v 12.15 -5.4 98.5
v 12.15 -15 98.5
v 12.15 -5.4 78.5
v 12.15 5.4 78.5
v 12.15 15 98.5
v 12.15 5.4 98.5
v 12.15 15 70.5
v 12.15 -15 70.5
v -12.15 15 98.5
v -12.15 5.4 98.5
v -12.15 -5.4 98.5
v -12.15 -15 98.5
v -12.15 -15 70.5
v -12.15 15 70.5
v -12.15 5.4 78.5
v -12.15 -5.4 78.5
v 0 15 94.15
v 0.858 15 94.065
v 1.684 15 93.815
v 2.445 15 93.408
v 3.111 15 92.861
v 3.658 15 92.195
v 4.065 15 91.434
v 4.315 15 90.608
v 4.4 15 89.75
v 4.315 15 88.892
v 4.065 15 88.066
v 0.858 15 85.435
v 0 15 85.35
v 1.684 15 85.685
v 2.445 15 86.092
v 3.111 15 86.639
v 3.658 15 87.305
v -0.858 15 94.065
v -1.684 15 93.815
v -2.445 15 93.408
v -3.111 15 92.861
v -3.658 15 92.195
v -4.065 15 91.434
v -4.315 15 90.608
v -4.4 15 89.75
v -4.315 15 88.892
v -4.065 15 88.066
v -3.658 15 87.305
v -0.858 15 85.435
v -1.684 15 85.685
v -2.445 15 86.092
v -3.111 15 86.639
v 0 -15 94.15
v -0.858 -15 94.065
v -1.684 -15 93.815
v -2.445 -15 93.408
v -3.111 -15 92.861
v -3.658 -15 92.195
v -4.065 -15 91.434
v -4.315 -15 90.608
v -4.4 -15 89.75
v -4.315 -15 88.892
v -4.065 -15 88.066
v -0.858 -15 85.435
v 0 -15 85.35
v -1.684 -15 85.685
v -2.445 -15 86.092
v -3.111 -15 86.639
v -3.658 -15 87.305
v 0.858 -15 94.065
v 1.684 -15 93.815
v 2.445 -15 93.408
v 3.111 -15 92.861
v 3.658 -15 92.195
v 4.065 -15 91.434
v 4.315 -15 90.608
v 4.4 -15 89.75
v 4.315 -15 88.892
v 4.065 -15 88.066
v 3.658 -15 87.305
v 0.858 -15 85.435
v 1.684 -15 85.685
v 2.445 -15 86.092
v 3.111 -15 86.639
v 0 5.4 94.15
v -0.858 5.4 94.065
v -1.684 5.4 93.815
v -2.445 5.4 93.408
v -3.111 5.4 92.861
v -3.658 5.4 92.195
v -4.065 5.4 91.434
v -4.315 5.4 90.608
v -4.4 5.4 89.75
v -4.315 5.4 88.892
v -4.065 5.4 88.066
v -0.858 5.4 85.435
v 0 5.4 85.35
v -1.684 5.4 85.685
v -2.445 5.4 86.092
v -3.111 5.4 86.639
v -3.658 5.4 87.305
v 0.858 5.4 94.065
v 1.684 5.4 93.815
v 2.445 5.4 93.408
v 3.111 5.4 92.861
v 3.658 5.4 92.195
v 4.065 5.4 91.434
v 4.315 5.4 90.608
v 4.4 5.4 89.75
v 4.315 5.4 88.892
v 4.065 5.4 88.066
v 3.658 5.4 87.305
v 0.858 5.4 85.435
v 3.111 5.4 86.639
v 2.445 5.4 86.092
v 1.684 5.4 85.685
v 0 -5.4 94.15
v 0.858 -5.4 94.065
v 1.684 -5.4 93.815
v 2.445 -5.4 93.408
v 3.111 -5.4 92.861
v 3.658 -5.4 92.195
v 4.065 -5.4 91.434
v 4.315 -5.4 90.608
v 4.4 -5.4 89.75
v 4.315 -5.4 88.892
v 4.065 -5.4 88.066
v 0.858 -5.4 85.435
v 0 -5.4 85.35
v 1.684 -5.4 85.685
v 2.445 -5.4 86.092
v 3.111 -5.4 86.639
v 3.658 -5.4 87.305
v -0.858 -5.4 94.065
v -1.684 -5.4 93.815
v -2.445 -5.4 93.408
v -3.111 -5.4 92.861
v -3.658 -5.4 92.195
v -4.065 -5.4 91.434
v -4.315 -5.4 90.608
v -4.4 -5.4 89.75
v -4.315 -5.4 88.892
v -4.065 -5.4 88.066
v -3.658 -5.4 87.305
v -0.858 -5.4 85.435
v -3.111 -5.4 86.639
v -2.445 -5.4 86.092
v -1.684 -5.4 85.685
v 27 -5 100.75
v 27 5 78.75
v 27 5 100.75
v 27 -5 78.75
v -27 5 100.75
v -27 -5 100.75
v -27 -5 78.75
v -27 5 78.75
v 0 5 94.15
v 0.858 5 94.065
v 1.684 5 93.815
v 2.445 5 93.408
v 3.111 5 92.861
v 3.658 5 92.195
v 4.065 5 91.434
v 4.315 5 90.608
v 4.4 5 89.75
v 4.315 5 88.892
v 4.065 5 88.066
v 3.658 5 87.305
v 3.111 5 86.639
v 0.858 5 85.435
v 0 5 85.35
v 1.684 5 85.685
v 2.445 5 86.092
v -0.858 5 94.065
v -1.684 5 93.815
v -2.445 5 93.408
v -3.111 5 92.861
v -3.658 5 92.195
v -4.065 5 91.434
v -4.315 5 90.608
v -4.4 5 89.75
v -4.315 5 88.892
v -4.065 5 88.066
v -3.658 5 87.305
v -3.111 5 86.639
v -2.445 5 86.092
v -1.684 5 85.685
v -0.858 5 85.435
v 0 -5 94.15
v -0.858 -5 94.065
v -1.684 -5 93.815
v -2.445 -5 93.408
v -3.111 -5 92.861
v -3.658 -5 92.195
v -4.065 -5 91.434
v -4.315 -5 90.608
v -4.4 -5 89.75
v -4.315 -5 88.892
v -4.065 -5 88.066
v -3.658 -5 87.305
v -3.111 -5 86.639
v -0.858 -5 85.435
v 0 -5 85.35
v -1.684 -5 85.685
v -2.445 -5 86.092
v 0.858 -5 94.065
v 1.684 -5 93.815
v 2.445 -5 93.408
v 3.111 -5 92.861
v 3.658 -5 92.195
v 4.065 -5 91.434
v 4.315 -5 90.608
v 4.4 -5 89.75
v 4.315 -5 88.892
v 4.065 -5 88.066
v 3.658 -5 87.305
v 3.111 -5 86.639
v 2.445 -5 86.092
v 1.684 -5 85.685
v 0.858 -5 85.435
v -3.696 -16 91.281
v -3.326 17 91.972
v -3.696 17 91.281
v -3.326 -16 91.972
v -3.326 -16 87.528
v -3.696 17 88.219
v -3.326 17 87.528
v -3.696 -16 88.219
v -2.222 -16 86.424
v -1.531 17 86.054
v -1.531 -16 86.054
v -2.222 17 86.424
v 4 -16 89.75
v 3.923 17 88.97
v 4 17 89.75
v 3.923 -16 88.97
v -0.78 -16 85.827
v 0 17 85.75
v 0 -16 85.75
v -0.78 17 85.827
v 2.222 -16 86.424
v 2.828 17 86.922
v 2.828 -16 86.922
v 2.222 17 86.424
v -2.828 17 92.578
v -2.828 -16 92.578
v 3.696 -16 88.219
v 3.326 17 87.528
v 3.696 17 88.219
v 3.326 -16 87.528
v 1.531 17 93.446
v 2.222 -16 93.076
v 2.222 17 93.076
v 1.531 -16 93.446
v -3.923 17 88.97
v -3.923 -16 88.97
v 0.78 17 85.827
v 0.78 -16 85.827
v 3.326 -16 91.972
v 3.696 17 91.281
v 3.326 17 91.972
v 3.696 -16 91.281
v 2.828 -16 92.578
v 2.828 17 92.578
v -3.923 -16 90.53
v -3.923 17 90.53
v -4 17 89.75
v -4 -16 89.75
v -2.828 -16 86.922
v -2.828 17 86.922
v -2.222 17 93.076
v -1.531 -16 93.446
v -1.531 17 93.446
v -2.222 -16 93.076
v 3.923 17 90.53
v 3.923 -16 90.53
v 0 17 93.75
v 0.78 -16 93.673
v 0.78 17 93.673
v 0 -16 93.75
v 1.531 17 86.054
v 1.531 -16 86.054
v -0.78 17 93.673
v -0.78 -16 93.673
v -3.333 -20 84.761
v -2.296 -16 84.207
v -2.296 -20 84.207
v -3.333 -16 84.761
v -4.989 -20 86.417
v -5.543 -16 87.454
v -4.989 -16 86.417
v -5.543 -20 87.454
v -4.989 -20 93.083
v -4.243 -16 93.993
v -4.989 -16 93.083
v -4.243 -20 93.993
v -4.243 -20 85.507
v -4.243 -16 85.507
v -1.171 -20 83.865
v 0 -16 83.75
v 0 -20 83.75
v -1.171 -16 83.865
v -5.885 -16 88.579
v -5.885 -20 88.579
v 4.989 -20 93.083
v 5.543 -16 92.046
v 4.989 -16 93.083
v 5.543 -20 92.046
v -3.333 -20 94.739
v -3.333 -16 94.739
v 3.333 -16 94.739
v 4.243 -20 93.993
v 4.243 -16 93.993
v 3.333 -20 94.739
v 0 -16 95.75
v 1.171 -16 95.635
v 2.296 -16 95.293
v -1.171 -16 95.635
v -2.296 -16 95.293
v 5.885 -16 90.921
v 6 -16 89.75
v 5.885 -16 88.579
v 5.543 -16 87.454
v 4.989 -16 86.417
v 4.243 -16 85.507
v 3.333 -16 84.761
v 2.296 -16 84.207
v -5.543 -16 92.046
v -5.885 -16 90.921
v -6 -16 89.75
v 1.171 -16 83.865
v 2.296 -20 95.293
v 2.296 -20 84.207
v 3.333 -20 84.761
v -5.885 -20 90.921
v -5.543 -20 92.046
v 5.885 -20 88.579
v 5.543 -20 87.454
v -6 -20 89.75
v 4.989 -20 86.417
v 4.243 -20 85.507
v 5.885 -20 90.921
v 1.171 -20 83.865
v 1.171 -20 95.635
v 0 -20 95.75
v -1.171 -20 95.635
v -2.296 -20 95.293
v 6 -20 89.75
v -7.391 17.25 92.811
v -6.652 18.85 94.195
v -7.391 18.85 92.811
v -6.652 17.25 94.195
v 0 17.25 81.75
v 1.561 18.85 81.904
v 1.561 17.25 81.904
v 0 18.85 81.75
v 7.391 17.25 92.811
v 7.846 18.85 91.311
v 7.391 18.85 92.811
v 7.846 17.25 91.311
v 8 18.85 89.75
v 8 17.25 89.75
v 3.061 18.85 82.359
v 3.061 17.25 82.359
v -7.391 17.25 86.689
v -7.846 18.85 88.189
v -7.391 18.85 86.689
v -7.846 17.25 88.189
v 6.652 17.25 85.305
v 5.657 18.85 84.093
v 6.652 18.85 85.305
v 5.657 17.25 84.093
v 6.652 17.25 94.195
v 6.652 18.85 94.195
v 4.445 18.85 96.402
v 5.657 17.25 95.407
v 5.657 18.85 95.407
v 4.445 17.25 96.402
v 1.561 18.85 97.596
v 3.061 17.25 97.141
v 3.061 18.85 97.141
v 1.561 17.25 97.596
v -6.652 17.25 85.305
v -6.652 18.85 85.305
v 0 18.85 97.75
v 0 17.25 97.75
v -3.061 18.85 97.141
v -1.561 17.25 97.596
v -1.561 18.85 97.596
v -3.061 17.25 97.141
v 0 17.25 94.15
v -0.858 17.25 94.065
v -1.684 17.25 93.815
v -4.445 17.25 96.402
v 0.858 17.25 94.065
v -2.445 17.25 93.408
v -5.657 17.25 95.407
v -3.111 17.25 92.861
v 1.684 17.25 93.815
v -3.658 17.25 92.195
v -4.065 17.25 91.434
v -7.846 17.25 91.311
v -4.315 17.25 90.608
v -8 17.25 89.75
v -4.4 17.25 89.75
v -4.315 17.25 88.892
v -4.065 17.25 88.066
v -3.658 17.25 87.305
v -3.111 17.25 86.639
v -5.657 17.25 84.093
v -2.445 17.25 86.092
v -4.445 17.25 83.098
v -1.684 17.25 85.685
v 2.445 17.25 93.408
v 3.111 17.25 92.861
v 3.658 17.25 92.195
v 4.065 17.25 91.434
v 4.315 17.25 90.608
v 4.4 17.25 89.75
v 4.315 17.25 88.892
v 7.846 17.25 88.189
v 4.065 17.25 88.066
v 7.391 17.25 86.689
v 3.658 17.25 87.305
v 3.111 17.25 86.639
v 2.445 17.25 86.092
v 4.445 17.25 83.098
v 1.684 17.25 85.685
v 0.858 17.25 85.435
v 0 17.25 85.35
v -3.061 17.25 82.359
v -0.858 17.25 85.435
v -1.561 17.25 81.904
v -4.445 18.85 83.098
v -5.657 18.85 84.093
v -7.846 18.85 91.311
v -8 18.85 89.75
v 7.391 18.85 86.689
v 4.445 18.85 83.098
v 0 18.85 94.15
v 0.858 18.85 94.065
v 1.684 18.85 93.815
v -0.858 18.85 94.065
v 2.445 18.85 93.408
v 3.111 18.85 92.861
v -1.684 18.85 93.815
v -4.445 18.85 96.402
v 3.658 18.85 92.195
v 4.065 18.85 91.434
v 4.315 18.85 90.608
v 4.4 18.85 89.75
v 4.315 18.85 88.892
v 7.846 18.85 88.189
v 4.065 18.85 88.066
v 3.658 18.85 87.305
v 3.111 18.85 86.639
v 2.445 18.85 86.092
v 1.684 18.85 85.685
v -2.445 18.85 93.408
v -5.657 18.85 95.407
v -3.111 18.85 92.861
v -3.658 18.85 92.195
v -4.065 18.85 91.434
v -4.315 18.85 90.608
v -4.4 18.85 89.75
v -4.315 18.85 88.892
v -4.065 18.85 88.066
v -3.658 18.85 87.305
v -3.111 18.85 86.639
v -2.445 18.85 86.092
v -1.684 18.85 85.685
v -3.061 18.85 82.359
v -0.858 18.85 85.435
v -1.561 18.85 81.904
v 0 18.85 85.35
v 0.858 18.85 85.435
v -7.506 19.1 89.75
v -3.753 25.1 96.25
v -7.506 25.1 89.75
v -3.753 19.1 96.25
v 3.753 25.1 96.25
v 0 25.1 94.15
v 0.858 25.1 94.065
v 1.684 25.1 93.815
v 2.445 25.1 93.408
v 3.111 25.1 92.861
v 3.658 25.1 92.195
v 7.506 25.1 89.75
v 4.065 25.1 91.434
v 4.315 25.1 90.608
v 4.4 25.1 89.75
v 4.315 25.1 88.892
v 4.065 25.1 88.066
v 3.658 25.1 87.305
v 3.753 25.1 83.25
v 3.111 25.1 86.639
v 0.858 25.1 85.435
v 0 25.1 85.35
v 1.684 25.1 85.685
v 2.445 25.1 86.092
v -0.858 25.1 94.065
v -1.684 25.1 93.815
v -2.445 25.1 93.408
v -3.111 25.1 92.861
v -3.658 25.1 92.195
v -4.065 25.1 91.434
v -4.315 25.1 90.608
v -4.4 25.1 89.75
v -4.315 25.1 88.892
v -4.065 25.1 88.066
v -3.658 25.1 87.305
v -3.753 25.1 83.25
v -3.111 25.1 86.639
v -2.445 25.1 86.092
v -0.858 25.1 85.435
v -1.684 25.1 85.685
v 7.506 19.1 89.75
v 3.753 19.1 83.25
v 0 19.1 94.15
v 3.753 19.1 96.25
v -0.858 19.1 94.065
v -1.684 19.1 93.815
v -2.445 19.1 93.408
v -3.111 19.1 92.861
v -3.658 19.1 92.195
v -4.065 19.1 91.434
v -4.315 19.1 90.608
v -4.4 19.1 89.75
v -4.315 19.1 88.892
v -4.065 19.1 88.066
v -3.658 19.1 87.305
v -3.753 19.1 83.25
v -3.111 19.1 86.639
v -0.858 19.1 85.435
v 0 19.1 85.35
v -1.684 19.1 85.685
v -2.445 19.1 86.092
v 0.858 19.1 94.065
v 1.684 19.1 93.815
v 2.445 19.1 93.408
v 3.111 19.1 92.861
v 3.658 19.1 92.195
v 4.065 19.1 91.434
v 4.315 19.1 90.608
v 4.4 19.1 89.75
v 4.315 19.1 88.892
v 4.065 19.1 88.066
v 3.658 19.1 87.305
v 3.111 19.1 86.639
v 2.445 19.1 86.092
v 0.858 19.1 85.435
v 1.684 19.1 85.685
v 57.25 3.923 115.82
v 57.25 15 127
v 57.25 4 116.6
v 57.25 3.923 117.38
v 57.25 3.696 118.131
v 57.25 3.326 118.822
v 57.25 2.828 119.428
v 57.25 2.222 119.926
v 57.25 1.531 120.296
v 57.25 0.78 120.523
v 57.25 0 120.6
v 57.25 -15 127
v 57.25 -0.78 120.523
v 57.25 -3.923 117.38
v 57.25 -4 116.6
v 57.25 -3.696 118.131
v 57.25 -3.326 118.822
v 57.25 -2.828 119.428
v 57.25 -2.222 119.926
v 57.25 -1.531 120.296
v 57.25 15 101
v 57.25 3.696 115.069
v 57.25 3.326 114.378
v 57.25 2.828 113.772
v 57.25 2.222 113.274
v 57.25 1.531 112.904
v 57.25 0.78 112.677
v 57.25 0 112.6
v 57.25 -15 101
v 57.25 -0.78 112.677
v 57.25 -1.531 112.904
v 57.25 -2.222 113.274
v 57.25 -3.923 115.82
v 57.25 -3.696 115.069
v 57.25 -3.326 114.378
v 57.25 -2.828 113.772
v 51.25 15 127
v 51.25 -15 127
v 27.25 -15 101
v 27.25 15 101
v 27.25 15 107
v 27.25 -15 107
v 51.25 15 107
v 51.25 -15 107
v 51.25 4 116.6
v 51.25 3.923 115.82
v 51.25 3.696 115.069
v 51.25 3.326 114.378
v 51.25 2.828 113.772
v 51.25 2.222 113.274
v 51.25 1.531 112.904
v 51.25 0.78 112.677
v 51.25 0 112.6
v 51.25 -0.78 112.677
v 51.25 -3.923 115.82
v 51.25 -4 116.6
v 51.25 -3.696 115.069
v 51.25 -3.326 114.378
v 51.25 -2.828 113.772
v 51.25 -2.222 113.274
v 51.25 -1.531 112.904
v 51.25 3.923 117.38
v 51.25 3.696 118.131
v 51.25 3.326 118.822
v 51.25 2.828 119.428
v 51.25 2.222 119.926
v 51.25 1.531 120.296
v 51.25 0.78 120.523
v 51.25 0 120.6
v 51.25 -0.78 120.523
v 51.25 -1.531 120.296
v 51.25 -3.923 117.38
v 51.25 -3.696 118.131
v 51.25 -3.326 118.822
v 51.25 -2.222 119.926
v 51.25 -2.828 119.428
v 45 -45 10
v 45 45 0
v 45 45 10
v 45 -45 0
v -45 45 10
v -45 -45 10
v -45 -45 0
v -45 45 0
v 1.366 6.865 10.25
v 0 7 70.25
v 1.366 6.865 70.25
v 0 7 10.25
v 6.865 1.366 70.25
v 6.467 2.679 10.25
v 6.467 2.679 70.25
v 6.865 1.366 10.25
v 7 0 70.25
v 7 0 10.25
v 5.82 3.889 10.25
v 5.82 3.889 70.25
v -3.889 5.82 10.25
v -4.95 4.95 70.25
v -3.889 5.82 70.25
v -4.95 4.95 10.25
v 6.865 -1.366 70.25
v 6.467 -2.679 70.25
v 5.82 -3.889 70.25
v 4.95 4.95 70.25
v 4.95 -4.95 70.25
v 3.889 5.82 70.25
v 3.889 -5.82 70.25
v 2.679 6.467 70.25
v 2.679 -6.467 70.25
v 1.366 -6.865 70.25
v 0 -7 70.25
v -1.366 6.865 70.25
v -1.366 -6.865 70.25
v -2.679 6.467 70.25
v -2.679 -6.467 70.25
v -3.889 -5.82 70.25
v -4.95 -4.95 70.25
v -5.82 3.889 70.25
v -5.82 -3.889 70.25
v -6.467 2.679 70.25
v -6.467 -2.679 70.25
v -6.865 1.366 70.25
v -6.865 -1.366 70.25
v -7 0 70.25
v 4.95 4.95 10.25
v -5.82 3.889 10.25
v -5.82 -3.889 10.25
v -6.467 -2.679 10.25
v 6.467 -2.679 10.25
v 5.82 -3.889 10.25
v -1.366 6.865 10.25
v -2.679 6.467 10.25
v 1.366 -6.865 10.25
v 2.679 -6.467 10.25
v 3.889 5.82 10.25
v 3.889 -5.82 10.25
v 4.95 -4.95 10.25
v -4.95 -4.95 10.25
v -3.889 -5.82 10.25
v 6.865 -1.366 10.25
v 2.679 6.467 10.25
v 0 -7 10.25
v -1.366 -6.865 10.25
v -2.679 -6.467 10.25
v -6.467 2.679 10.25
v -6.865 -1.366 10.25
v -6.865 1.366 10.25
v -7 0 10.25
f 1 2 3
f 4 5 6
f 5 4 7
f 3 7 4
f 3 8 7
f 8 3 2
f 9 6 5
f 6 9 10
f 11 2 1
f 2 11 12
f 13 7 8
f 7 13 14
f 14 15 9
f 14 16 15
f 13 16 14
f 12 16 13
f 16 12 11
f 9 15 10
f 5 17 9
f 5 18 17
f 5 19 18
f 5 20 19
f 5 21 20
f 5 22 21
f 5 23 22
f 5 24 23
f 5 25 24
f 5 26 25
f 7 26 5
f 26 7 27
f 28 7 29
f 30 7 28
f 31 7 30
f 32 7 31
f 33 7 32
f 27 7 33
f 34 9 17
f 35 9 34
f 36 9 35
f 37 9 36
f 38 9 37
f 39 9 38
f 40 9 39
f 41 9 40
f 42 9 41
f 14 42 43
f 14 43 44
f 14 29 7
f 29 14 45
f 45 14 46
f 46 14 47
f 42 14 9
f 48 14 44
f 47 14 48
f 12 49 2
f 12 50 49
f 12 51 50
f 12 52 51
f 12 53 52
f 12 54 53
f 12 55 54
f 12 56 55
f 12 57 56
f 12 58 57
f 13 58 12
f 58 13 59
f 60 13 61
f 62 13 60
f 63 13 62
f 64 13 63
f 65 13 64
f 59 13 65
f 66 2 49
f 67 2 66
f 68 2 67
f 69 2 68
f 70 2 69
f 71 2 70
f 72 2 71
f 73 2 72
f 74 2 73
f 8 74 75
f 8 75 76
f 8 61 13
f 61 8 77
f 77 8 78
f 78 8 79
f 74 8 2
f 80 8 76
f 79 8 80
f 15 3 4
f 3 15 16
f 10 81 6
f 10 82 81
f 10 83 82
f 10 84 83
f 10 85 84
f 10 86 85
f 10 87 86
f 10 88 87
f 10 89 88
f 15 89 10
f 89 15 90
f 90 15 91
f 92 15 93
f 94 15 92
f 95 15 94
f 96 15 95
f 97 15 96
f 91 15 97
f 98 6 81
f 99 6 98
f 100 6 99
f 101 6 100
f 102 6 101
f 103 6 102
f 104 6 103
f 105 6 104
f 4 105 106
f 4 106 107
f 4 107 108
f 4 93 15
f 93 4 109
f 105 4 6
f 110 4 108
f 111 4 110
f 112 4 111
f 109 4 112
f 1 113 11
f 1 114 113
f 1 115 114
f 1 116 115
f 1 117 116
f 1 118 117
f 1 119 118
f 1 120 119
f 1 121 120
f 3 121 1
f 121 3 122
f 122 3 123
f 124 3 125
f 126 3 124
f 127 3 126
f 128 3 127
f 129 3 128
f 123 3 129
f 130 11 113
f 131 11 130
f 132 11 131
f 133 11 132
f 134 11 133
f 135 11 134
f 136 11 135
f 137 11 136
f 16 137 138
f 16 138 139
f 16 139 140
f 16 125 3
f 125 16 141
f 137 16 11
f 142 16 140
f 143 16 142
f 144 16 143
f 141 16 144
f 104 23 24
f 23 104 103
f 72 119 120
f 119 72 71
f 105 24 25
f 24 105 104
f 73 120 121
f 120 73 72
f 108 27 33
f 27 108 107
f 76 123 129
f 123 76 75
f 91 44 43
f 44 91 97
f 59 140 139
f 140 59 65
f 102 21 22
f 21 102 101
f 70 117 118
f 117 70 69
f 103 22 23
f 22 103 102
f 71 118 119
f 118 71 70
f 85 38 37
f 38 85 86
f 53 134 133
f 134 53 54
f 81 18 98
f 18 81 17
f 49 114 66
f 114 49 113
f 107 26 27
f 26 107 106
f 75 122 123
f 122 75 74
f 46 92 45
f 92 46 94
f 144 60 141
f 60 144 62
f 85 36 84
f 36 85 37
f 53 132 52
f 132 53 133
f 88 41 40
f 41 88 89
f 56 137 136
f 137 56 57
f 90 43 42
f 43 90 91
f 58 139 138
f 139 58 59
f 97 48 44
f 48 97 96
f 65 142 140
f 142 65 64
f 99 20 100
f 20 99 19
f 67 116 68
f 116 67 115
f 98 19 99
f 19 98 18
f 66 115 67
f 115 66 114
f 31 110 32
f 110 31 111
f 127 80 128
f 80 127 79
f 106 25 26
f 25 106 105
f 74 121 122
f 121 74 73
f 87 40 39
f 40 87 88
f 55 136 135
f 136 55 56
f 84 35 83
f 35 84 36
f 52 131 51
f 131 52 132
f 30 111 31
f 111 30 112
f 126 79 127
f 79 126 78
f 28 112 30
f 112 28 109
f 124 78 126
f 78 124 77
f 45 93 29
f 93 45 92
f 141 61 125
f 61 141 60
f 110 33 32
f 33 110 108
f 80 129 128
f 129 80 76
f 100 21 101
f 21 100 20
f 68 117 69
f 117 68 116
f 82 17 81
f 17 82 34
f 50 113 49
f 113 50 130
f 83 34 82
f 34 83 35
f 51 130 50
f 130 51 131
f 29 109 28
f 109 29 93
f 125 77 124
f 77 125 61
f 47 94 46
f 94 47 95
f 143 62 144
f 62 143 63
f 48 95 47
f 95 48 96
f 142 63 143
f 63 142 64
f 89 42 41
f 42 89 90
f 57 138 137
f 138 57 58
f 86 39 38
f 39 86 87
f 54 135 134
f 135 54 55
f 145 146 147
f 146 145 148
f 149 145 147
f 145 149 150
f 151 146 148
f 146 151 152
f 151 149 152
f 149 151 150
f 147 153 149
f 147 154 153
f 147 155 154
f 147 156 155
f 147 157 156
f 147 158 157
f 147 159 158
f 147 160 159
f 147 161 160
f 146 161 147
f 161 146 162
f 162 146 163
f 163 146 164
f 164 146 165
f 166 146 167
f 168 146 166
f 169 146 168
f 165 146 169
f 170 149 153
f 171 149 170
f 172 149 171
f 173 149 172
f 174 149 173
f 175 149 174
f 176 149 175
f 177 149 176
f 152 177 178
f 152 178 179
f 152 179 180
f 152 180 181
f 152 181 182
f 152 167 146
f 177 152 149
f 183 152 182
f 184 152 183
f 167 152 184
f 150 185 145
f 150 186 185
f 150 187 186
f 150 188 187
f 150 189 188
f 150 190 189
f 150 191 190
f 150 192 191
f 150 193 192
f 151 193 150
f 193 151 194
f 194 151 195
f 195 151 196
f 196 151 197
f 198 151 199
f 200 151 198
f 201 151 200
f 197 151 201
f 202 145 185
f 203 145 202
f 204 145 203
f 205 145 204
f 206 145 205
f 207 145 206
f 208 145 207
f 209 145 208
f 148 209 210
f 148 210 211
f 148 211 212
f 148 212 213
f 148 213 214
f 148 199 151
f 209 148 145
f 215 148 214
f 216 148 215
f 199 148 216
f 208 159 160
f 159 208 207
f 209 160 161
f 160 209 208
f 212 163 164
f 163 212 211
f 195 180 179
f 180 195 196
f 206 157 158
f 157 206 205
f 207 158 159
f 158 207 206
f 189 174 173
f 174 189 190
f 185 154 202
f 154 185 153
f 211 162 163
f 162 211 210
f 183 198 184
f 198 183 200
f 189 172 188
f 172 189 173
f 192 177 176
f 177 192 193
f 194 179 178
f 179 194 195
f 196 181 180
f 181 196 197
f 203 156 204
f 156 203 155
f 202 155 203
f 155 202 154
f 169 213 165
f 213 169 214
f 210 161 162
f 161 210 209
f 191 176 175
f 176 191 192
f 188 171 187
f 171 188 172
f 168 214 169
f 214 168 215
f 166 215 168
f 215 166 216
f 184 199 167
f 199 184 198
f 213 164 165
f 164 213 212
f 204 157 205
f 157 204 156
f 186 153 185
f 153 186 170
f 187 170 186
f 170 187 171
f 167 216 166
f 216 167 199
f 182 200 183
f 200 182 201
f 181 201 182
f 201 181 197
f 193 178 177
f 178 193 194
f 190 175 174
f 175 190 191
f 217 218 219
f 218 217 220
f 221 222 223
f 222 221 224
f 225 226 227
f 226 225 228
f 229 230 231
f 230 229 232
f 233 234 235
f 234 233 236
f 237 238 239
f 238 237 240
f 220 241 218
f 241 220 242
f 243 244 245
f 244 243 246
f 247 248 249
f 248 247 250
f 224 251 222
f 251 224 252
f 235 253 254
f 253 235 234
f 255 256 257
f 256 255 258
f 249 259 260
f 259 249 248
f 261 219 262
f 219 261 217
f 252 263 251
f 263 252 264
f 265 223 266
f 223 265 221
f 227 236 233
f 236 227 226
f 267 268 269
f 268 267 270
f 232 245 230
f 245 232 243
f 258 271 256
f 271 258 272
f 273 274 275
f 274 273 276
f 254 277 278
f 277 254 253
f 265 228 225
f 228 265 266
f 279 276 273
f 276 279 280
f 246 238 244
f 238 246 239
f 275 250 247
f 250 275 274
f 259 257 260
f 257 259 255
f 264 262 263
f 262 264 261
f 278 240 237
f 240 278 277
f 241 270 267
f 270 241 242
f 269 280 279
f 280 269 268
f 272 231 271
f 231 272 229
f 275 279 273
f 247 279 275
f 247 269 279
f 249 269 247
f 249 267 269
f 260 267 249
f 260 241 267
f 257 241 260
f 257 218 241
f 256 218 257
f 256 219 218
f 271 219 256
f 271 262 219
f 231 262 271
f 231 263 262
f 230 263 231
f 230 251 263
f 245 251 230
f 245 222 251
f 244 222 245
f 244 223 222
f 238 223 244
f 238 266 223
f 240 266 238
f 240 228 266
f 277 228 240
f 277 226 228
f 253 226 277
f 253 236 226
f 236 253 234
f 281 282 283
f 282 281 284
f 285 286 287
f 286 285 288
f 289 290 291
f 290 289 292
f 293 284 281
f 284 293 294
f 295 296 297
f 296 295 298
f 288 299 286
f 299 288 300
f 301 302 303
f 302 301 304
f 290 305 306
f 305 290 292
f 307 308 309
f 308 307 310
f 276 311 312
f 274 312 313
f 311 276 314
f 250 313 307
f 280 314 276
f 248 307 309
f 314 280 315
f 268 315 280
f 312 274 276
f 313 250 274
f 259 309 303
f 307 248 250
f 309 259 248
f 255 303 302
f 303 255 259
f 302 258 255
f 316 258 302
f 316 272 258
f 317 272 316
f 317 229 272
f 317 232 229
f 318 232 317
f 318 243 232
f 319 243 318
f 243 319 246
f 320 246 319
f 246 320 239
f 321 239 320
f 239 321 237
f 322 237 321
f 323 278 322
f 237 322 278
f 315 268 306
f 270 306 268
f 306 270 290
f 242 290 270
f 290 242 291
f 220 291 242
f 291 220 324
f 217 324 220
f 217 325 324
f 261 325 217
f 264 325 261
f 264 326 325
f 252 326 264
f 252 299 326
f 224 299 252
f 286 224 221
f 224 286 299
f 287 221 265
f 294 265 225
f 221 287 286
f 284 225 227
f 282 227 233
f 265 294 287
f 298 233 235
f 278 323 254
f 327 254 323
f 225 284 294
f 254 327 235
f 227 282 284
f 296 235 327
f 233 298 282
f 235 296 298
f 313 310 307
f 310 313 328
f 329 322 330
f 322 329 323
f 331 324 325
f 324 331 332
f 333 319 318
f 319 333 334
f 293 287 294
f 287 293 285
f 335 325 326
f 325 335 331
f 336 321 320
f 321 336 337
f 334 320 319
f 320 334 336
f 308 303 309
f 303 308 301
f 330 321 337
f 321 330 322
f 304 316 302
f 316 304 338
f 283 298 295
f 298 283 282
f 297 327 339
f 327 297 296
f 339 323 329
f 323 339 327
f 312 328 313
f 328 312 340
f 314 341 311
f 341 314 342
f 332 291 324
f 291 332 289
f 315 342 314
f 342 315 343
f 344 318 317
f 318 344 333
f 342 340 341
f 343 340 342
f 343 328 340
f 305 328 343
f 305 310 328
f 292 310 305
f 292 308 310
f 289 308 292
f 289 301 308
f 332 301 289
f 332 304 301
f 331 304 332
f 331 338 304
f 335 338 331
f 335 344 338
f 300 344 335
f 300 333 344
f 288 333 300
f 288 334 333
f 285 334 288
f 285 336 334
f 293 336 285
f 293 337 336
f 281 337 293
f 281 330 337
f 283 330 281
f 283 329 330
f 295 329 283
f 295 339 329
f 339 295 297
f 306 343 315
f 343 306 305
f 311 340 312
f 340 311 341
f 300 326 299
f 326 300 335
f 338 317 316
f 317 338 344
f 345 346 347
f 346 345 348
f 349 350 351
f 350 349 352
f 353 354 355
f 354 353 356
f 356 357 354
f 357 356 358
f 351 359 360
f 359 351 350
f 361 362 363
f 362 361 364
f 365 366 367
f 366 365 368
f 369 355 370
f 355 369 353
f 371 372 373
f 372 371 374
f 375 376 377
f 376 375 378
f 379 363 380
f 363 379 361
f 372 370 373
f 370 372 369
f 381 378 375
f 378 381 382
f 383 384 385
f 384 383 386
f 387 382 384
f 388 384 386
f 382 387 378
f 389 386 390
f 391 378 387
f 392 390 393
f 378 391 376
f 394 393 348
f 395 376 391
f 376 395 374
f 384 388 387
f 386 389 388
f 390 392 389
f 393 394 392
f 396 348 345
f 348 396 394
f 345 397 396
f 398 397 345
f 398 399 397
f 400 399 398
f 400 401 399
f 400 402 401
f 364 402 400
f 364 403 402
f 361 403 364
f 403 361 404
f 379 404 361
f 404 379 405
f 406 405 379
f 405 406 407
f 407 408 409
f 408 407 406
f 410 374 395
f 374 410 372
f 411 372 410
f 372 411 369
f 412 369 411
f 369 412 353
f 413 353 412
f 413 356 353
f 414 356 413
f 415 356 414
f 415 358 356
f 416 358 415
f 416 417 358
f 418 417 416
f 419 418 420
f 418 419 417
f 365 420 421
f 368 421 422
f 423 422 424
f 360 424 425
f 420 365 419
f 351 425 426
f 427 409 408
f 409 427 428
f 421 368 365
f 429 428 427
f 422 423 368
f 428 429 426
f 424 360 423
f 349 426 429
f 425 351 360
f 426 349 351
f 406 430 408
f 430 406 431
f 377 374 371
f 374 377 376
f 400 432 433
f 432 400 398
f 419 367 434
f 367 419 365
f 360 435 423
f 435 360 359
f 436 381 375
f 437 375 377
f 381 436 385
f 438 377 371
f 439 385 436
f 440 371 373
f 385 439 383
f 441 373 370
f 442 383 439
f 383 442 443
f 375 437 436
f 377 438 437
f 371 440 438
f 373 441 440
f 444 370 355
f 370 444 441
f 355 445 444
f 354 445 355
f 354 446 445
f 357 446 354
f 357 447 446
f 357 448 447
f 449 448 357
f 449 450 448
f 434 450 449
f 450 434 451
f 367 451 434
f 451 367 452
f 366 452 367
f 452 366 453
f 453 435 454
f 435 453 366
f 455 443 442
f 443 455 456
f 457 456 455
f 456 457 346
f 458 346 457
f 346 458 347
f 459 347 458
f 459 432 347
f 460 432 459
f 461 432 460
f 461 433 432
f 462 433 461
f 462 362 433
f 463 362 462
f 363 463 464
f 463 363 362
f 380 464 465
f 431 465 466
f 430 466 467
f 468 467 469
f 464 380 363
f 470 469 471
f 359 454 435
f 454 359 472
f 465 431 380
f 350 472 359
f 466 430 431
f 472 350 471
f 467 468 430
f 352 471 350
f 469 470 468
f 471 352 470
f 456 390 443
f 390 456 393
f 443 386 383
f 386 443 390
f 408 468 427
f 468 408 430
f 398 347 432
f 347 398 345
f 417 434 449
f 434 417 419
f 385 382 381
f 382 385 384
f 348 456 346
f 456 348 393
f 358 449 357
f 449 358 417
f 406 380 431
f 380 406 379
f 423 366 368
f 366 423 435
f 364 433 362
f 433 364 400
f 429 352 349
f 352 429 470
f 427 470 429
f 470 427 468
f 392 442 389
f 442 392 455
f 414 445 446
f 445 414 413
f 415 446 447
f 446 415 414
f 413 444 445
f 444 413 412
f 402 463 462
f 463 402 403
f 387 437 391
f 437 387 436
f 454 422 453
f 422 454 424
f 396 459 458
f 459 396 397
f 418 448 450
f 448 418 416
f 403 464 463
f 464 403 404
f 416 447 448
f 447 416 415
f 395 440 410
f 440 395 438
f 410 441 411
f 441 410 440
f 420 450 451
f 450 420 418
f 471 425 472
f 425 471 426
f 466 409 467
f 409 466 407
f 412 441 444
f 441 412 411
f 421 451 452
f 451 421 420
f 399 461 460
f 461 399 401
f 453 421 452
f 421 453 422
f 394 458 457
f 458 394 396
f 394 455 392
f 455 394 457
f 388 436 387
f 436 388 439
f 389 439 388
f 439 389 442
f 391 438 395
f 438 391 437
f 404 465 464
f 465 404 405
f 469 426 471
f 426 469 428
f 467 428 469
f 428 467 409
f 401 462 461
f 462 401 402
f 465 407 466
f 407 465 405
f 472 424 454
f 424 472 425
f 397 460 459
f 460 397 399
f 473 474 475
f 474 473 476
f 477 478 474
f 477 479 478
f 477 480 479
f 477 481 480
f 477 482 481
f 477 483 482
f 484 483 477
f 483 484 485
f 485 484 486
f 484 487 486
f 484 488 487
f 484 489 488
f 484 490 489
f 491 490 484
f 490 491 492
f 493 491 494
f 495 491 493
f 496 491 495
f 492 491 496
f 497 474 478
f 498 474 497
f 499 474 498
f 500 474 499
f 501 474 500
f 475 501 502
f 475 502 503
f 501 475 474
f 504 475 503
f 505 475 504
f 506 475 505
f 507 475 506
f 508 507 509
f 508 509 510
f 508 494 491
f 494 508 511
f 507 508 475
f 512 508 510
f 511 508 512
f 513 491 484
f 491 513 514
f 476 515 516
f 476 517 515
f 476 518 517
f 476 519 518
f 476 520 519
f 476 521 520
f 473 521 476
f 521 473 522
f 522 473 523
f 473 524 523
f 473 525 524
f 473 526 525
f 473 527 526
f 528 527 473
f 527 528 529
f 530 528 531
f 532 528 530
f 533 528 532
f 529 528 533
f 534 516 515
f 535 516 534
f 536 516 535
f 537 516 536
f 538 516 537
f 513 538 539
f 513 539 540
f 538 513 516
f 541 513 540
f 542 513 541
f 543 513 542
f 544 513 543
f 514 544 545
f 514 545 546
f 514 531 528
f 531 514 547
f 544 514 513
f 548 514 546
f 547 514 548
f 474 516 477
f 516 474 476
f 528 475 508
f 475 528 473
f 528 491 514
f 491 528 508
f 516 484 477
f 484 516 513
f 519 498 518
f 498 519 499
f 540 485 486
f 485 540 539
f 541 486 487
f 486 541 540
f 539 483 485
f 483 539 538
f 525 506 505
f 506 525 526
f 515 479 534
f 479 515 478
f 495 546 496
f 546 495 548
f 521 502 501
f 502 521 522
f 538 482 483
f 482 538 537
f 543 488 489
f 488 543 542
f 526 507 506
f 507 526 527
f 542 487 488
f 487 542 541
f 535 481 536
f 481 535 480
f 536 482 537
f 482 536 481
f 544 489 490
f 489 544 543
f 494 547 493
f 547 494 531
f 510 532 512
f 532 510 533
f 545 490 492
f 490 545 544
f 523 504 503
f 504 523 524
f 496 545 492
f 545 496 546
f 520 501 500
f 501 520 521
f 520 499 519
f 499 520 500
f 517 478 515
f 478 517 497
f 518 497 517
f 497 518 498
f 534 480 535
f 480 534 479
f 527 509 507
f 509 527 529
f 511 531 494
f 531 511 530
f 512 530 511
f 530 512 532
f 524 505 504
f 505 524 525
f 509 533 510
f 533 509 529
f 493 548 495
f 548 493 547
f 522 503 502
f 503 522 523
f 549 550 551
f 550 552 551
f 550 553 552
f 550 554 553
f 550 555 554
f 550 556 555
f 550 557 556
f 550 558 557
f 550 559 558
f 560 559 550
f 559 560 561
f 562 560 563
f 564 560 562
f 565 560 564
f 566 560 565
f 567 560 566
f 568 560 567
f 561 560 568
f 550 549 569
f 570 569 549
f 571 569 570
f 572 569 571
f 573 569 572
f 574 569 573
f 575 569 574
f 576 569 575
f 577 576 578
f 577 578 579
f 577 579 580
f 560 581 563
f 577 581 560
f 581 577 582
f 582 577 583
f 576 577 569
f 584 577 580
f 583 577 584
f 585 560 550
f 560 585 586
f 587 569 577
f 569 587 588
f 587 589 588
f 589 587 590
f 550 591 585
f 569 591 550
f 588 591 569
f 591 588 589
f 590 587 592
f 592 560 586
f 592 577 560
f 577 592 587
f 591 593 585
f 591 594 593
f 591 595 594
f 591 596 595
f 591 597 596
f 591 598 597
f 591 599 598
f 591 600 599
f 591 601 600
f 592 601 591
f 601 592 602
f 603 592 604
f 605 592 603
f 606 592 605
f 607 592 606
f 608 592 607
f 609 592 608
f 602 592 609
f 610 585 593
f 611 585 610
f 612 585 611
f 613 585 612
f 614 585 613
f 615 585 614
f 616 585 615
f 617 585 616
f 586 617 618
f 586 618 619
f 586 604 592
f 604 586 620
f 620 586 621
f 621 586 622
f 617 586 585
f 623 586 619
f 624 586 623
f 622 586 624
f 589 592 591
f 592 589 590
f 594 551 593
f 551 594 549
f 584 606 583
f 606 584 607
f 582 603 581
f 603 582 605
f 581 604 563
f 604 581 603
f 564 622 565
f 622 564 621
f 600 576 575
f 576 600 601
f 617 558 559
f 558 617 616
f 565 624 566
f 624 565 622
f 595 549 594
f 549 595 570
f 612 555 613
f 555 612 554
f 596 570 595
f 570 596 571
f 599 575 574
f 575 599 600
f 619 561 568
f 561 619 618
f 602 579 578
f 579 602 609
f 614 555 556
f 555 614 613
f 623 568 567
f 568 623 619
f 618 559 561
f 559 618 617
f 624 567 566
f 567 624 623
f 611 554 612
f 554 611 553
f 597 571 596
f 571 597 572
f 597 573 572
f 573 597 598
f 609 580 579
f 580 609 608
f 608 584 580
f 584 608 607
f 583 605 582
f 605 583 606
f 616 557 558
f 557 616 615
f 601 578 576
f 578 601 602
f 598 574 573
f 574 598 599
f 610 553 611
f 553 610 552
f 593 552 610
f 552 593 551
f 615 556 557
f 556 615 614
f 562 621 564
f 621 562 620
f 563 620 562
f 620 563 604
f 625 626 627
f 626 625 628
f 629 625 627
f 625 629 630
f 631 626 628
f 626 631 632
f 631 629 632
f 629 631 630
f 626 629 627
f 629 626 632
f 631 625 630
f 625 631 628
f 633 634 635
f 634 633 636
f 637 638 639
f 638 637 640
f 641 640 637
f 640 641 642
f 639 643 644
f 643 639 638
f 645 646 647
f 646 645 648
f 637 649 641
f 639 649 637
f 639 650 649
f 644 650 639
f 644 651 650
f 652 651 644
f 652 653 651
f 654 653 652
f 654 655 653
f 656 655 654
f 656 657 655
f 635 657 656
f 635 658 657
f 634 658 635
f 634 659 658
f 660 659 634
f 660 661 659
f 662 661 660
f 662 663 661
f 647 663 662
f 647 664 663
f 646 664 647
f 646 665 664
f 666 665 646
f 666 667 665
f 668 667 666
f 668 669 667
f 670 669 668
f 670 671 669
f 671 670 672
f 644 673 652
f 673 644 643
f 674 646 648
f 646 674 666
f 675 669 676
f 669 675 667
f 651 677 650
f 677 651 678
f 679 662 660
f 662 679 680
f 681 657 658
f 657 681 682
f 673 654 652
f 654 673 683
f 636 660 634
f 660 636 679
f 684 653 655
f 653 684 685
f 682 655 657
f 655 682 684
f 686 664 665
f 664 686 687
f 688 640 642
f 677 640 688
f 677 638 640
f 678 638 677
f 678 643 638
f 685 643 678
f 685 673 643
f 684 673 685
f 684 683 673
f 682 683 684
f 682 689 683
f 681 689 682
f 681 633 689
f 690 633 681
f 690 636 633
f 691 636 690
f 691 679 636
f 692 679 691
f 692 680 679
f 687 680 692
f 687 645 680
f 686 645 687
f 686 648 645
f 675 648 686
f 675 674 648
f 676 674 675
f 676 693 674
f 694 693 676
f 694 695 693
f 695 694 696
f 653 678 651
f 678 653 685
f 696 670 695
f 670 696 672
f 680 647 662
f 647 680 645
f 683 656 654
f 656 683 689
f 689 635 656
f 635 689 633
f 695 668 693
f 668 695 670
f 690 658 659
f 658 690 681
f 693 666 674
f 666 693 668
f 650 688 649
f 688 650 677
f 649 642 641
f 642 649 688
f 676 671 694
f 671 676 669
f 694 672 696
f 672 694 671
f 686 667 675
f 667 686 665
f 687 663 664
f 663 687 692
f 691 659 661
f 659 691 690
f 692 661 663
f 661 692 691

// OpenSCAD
$fn = 32;

// ------------------------------------------------------------------------
// Lamp arm: column d14 x 60 mm, arm 54 mm
// Every part is its own module, assembly() places every instance.
// ------------------------------------------------------------------------

// --- part 1 ---
module lamp_base() {
  difference() {
    translate([-45, -45, 0]) cube([90, 90, 10]);
  }
}

// --- part 2 ---
module lamp_column() {
  cylinder(h = 60, d = 14);
}

// --- part 3 ---
module head_fork() {
  difference() {
    translate([-12.15, -15, 0]) cube([24.3, 30, 28]);
    translate([-13.15, -5.4, 8]) cube([26.3, 10.8, 21]);
    translate([0, 0, 19.25]) rotate([90, 0, 0]) cylinder(h = 32, d = 8.8, center = true);
  }
}

// --- part 4 ---
module lamp_arm() {
  difference() {
    translate([-27, -5, 0]) cube([54, 10, 22]);
    translate([0, 0, 11]) rotate([90, 0, 0]) cylinder(h = 12, d = 8.8, center = true);
  }
}

// --- part 5 ---
module arm_pin() {
  rotate([0, 90, 0]) cylinder(h = 34, d = 8, center = true);
  translate([-20, 0, 0]) rotate([0, 90, 0]) cylinder(h = 4, d = 12);
}

// --- part 6 ---
module arm_washer() {
  difference() {
      translate([0, 0, 0]) cylinder(h = 1.6, d = 16);
      translate([0, 0, -1]) cylinder(h = 3.6, d = 8.8);
    }
}

// --- part 7 ---
module arm_nut() {
  difference() {
    linear_extrude(height = 6) polygon(points = [[7.506, 0], [3.753, 6.5], [-3.753, 6.5], [-7.506, 0], [-3.753, -6.5], [3.753, -6.5]]);
    translate([0, 0, -1]) cylinder(h = 8, d = 8.8);
  }
}

// --- part 8 ---
module shade_bracket() {
  difference() {
    translate([-15, -15, 0]) cube([30, 30, 26]);
    translate([-16, -16, 6]) cube([25, 32, 21]);
    translate([12, 0, 15.6]) rotate([0, 90, 0]) cylinder(h = 8, d = 8, center = true);
  }
}

// --- assembly ---
module assembly() {
  color([0.80, 0.24, 0.20]) translate([0, 0, 0]) rotate([0, 0, 0]) lamp_base();
  color([0.20, 0.45, 0.75]) translate([0, 0, 10.25]) rotate([0, 0, 0]) lamp_column();
  color([0.25, 0.62, 0.32]) translate([0, 0, 70.5]) rotate([0, 0, 0]) head_fork();
  color([0.92, 0.70, 0.18]) translate([0, 0, 78.75]) rotate([0, 0, 0]) lamp_arm();
  color([0.58, 0.35, 0.70]) translate([0, 0, 89.75]) rotate([0, 0, 90]) arm_pin();
  color([0.16, 0.66, 0.66]) translate([0, 18.85, 89.75]) rotate([90, 0, 0]) arm_washer();
  color([0.85, 0.48, 0.18]) translate([0, 25.1, 89.75]) rotate([90, 0, 0]) arm_nut();
  color([0.55, 0.60, 0.65]) translate([42.25, 0, 101]) rotate([0, 0, 0]) shade_bracket();
}

assembly();
